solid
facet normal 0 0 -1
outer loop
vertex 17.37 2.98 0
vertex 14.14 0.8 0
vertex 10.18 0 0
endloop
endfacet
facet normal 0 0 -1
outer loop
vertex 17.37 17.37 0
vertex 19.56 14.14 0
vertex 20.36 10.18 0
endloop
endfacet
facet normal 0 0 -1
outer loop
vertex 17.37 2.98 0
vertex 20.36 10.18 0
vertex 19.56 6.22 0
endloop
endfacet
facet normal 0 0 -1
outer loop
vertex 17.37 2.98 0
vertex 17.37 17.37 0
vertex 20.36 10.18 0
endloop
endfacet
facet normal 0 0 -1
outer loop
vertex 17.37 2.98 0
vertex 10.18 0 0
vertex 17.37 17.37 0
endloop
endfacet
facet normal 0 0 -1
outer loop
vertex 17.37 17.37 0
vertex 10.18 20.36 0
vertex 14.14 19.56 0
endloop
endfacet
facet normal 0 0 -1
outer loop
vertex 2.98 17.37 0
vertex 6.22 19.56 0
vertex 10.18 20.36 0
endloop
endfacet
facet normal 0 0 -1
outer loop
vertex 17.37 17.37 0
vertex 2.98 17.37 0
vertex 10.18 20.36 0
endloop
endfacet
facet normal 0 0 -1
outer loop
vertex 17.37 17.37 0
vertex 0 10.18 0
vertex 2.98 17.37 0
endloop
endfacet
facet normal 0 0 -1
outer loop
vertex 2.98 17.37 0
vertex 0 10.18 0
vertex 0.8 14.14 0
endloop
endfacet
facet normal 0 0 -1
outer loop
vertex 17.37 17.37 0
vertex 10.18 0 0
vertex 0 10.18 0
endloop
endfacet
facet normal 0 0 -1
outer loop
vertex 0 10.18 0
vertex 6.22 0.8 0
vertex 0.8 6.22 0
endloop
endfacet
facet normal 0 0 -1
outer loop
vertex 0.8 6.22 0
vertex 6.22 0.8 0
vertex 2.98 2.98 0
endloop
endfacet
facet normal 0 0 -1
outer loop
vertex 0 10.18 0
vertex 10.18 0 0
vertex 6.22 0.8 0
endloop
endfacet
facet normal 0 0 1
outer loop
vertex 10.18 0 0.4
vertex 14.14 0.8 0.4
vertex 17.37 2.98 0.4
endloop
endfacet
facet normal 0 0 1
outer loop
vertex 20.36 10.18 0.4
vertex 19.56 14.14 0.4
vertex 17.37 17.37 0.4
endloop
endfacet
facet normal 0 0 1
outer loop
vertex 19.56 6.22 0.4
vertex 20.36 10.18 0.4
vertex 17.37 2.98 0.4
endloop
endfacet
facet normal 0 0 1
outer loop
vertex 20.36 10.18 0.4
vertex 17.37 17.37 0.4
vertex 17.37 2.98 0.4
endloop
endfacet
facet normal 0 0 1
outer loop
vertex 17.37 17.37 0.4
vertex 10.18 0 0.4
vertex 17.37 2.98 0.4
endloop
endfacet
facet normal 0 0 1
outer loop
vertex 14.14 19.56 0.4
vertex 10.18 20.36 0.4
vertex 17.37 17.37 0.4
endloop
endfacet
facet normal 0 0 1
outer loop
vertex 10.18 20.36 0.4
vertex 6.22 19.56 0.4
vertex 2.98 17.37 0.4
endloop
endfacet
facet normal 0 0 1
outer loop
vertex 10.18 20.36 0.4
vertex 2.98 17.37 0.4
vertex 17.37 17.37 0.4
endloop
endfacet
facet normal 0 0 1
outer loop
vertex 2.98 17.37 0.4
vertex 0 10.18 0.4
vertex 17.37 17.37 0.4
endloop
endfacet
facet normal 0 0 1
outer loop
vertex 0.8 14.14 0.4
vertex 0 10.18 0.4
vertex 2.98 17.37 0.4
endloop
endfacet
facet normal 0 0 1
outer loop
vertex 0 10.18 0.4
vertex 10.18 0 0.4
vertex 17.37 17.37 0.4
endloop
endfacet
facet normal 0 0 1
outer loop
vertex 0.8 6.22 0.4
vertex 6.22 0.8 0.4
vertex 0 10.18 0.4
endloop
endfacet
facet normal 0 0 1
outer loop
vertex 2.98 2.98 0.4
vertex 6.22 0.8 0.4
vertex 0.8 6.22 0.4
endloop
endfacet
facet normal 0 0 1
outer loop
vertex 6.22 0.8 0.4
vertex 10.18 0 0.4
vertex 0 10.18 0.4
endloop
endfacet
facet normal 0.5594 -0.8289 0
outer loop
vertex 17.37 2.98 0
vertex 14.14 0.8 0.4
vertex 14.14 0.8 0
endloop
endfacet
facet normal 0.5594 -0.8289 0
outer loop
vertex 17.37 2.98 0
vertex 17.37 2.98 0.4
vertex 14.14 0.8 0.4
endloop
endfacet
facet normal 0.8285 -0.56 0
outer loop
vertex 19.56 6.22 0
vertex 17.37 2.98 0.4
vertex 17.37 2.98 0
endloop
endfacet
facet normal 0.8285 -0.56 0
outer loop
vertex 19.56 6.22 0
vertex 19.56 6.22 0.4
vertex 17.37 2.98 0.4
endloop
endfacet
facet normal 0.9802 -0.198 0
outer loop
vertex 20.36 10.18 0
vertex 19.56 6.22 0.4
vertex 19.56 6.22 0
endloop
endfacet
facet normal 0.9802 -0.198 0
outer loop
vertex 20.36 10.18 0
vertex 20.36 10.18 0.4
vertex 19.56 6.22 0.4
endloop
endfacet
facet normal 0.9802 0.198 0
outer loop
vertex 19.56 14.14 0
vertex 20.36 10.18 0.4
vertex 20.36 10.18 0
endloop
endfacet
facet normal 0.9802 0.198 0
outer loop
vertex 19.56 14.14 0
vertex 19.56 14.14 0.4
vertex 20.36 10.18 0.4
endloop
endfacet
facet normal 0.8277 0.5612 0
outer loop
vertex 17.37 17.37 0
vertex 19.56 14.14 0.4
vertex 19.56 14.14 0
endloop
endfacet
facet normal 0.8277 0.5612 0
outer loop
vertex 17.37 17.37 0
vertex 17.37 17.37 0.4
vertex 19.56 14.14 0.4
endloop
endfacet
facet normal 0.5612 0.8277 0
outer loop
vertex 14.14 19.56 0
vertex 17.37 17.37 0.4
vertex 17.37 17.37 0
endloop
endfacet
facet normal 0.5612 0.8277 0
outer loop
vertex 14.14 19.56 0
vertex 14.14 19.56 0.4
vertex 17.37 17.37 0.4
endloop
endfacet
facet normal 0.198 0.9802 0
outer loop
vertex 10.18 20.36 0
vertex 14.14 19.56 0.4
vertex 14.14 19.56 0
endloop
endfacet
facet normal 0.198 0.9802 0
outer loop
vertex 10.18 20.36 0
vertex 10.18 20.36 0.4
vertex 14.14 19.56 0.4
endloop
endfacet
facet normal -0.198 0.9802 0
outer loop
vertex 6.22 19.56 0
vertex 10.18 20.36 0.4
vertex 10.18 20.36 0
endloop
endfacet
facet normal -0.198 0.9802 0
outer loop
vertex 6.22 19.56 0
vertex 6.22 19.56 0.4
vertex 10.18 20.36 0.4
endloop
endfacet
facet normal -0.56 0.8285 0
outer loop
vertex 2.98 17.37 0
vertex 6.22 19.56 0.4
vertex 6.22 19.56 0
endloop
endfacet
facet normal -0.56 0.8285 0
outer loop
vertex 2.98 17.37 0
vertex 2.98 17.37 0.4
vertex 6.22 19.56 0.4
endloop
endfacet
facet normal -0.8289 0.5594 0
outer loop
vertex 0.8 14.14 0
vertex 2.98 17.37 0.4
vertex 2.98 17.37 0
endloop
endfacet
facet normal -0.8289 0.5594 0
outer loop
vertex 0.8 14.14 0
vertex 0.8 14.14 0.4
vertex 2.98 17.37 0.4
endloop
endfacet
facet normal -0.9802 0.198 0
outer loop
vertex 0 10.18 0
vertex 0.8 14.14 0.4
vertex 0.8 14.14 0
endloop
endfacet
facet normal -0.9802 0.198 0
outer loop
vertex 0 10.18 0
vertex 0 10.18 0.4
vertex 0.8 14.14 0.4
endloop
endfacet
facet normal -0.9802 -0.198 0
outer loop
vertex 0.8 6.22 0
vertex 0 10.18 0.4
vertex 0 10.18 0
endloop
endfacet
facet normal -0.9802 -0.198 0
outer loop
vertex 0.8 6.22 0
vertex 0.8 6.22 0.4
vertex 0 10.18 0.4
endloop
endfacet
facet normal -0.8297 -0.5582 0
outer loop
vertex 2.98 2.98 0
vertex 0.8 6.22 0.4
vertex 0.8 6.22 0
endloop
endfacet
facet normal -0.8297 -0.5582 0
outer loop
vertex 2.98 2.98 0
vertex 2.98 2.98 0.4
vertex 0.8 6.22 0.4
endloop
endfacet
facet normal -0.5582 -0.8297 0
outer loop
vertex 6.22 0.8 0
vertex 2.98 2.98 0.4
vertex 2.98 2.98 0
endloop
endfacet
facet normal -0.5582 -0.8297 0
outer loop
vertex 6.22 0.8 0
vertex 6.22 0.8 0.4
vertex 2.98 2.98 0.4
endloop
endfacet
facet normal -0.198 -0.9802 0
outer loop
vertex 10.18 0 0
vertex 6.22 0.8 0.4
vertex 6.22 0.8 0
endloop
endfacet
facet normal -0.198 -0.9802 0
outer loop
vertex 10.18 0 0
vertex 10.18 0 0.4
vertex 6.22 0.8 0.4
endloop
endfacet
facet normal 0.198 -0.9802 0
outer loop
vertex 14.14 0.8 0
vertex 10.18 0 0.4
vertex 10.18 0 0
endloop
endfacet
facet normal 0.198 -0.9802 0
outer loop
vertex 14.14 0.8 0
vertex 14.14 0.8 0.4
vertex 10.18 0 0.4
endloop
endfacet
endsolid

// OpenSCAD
// file: generated_guitarHook.scad
// Generated by "ink2scad" inkscape extension. http://nickthecoder.co.uk/software/view/ink2scad
//
// Names are based on the inkscape path's id. Use Shift+Ctrl++O in inkscape to edit the paths' ids.
// For each inkscape path, a variable is created, which defines the path. The data takes the form :
//
//     [ points, paths, [ox,oy], [width,height] ]
//
//     points         : An array of 2D coordinates. Passed to polygon's 'points' parameter.
//     paths          : An array of array of integers. Passed to polygon's 'paths' parameter.
//     [width,height] : The size of the path's bounding box.
//     [left,bottom]  : The position of the path's bottom left corner (When exporting more than one object).
//
// Example simple extrusions : :
//     linear_extrude( height = 10 ) ink2scad( myshape );
//

// Creates a 2D polygon from the data generated by the ink2scad inkscape plugin.
//
// data        : The definition of your shape (see header above for details)
// center      : If true, the polygon is create centered at (0,0)
// relative    : If true, the polygon is created at a position relative to the other generated objects 
// convexity   : Only used during openSCAD's preview mode
//
module ink2scad( data, center=false, relativeTo, convexity=4 )
{
    if ( center ) {
        translate( -data[2]/2 ) polygon( points=data[0], paths=data[1], convexity=convexity );
    } else {
        if ( relativeTo ) {
            translate( data[3] - relativeTo[3] ) polygon( points=data[0], paths=data[1], convexity=convexity );
        } else {
            polygon( points=data[0], paths=data[1], convexity=convexity );
        }
    }
}

//
// Example usage :
// linear_extrude( 10 ) ink2scad( myshape, center=true );
//

bridge2 = [
    [ [0,1.44], [15.47,2.04], [15.52,0.60], [0.06,0] ],
    [ [3,2,1,0] ],
    [15.52,2.04],
    [99.46,-179.58]
];


pickGuard = [
    [ [6.31,32.35], [8.21,28.66], [8.94,24.90], [8.66,21.38], [7.52,18.38], [6.02,16.12], [4.42,14.43], [0,11.88], [1.26,8.77], [1.44,6.29], [1.43,4.09], [2.12,1.80], [2.90,0.82], [3.87,0.26], [6.35,0.09], [12.73,1.26], [15.50,1.42], [17.25,1.13], [20.30,0], [19.74,3.59], [18.57,6.75], [14.72,13.10], [13.81,14.94], [13.34,16.91], [13.31,21], [13.83,24.86], [14.09,28.02], [13.84,29.18], [13.24,30.08], [11.30,31.24] ],
    [ [0,1,2,3,4,5,6,7,8,9,10,11,12,13,14,15,16,17,18,19,20,21,22,23,24,25,26,27,28,29] ],
    [20.30,32.35],
    [111.38,-173.54]
];


body = [
    [ [33.83,100.14], [29.20,99.81], [24.44,99.09], [19.79,97.68], [15.49,95.29], [13.21,93.15], [11.71,90.81], [10.84,88.38], [10.47,85.97], [10.64,81.64], [11.07,78.66], [12.07,71.92], [12.40,68.24], [12.21,63.62], [11.23,58.66], [9.46,53.95], [4.14,43.43], [1.58,36.85], [0.53,32.37], [0,27.40], [0.27,22.14], [1.63,16.80], [4.34,11.60], [8.68,6.76], [11.91,4.44], [15.51,2.72], [19.37,1.50], [23.37,0.70], [31.34,0.01], [38.47,0], [45.44,0.08], [53.12,0.70], [57.03,1.47], [60.87,2.69], [64.56,4.46], [68.04,6.89], [72.61,11.63], [75.57,16.69], [77.18,21.87], [77.72,26.97], [77.45,31.81], [76.65,36.19], [74.55,42.78], [71.93,48.24], [69.39,52.71], [67.30,57.33], [66.06,63.25], [66.04,67.08], [66.53,70.88], [67.70,78.37], [67.93,81.47], [67.69,86.07], [67.10,88.62], [66.04,91.17], [64.40,93.59], [62.07,95.76], [57.66,98.10], [52.88,99.37], [48.27,99.93], [44.37,100.14] ],
    [ [0,1,2,3,4,5,6,7,8,9,10,11,12,13,14,15,16,17,18,19,20,21,22,23,24,25,26,27,28,29,30,31,32,33,34,35,36,37,38,39,40,41,42,43,44,45,46,47,48,49,50,51,52,53,54,55,56,57,58,59] ],
    [77.72,100.14],
    [67.70,-218.10]
];


neck = [
    [ [0.86,25.95], [11.91,25.90], [12.39,0], [0,0.09] ],
    [ [3,2,1,0] ],
    [12.39,25.95],
    [100.97,-138.04]
];


rect2998 = [
    [ [0,6.98], [7.18,6.98], [7.18,0], [0,0] ],
    [ [3,2,1,0] ],
    [7.18,6.98],
    [22.15,-101.63]
];


bridge = [
    [ [2.09,10.23], [0,3.54], [2.51,3.59], [4.66,3.27], [8.36,1.98], [12.12,0.58], [16.96,0], [21.92,0.80], [25.91,2.32], [29.80,3.61], [31.97,3.88], [34.42,3.74], [32.22,10.13], [28.06,9.19], [24.55,8.84], [17.27,8.75], [9.88,8.87], [6.29,9.25] ],
    [ [0,1,2,3,4,5,6,7,8,9,10,11,12,13,14,15,16,17] ],
    [34.42,10.23],
    [89.90,-185.05]
];


soundHole = [
    [ [20.36,10.18], [19.56,6.22], [17.37,2.98], [14.14,0.80], [10.18,0], [6.22,0.80], [2.98,2.98], [0.80,6.22], [0,10.18], [0.80,14.14], [2.98,17.37], [6.22,19.56], [10.18,20.36], [14.14,19.56], [17.37,17.37], [19.56,14.14] ],
    [ [15,14,13,12,11,10,9,8,7,6,5,4,3,2,1,0] ],
    [20.36,20.36],
    [97.39,-159.10]
];
// main file
include <generated_guitarHook.scad>;

// Make the sound hole inset a little smaller than the sound hole, so that it fits in easily.
// This object will hide the screw.
// Colour : Black
linear_extrude( 0.4 ) {
    // Commented out, while using an old version of openSCAD, which doesn't support offset
    //offset( -0.5 )
    ink2scad( soundHole );
}
